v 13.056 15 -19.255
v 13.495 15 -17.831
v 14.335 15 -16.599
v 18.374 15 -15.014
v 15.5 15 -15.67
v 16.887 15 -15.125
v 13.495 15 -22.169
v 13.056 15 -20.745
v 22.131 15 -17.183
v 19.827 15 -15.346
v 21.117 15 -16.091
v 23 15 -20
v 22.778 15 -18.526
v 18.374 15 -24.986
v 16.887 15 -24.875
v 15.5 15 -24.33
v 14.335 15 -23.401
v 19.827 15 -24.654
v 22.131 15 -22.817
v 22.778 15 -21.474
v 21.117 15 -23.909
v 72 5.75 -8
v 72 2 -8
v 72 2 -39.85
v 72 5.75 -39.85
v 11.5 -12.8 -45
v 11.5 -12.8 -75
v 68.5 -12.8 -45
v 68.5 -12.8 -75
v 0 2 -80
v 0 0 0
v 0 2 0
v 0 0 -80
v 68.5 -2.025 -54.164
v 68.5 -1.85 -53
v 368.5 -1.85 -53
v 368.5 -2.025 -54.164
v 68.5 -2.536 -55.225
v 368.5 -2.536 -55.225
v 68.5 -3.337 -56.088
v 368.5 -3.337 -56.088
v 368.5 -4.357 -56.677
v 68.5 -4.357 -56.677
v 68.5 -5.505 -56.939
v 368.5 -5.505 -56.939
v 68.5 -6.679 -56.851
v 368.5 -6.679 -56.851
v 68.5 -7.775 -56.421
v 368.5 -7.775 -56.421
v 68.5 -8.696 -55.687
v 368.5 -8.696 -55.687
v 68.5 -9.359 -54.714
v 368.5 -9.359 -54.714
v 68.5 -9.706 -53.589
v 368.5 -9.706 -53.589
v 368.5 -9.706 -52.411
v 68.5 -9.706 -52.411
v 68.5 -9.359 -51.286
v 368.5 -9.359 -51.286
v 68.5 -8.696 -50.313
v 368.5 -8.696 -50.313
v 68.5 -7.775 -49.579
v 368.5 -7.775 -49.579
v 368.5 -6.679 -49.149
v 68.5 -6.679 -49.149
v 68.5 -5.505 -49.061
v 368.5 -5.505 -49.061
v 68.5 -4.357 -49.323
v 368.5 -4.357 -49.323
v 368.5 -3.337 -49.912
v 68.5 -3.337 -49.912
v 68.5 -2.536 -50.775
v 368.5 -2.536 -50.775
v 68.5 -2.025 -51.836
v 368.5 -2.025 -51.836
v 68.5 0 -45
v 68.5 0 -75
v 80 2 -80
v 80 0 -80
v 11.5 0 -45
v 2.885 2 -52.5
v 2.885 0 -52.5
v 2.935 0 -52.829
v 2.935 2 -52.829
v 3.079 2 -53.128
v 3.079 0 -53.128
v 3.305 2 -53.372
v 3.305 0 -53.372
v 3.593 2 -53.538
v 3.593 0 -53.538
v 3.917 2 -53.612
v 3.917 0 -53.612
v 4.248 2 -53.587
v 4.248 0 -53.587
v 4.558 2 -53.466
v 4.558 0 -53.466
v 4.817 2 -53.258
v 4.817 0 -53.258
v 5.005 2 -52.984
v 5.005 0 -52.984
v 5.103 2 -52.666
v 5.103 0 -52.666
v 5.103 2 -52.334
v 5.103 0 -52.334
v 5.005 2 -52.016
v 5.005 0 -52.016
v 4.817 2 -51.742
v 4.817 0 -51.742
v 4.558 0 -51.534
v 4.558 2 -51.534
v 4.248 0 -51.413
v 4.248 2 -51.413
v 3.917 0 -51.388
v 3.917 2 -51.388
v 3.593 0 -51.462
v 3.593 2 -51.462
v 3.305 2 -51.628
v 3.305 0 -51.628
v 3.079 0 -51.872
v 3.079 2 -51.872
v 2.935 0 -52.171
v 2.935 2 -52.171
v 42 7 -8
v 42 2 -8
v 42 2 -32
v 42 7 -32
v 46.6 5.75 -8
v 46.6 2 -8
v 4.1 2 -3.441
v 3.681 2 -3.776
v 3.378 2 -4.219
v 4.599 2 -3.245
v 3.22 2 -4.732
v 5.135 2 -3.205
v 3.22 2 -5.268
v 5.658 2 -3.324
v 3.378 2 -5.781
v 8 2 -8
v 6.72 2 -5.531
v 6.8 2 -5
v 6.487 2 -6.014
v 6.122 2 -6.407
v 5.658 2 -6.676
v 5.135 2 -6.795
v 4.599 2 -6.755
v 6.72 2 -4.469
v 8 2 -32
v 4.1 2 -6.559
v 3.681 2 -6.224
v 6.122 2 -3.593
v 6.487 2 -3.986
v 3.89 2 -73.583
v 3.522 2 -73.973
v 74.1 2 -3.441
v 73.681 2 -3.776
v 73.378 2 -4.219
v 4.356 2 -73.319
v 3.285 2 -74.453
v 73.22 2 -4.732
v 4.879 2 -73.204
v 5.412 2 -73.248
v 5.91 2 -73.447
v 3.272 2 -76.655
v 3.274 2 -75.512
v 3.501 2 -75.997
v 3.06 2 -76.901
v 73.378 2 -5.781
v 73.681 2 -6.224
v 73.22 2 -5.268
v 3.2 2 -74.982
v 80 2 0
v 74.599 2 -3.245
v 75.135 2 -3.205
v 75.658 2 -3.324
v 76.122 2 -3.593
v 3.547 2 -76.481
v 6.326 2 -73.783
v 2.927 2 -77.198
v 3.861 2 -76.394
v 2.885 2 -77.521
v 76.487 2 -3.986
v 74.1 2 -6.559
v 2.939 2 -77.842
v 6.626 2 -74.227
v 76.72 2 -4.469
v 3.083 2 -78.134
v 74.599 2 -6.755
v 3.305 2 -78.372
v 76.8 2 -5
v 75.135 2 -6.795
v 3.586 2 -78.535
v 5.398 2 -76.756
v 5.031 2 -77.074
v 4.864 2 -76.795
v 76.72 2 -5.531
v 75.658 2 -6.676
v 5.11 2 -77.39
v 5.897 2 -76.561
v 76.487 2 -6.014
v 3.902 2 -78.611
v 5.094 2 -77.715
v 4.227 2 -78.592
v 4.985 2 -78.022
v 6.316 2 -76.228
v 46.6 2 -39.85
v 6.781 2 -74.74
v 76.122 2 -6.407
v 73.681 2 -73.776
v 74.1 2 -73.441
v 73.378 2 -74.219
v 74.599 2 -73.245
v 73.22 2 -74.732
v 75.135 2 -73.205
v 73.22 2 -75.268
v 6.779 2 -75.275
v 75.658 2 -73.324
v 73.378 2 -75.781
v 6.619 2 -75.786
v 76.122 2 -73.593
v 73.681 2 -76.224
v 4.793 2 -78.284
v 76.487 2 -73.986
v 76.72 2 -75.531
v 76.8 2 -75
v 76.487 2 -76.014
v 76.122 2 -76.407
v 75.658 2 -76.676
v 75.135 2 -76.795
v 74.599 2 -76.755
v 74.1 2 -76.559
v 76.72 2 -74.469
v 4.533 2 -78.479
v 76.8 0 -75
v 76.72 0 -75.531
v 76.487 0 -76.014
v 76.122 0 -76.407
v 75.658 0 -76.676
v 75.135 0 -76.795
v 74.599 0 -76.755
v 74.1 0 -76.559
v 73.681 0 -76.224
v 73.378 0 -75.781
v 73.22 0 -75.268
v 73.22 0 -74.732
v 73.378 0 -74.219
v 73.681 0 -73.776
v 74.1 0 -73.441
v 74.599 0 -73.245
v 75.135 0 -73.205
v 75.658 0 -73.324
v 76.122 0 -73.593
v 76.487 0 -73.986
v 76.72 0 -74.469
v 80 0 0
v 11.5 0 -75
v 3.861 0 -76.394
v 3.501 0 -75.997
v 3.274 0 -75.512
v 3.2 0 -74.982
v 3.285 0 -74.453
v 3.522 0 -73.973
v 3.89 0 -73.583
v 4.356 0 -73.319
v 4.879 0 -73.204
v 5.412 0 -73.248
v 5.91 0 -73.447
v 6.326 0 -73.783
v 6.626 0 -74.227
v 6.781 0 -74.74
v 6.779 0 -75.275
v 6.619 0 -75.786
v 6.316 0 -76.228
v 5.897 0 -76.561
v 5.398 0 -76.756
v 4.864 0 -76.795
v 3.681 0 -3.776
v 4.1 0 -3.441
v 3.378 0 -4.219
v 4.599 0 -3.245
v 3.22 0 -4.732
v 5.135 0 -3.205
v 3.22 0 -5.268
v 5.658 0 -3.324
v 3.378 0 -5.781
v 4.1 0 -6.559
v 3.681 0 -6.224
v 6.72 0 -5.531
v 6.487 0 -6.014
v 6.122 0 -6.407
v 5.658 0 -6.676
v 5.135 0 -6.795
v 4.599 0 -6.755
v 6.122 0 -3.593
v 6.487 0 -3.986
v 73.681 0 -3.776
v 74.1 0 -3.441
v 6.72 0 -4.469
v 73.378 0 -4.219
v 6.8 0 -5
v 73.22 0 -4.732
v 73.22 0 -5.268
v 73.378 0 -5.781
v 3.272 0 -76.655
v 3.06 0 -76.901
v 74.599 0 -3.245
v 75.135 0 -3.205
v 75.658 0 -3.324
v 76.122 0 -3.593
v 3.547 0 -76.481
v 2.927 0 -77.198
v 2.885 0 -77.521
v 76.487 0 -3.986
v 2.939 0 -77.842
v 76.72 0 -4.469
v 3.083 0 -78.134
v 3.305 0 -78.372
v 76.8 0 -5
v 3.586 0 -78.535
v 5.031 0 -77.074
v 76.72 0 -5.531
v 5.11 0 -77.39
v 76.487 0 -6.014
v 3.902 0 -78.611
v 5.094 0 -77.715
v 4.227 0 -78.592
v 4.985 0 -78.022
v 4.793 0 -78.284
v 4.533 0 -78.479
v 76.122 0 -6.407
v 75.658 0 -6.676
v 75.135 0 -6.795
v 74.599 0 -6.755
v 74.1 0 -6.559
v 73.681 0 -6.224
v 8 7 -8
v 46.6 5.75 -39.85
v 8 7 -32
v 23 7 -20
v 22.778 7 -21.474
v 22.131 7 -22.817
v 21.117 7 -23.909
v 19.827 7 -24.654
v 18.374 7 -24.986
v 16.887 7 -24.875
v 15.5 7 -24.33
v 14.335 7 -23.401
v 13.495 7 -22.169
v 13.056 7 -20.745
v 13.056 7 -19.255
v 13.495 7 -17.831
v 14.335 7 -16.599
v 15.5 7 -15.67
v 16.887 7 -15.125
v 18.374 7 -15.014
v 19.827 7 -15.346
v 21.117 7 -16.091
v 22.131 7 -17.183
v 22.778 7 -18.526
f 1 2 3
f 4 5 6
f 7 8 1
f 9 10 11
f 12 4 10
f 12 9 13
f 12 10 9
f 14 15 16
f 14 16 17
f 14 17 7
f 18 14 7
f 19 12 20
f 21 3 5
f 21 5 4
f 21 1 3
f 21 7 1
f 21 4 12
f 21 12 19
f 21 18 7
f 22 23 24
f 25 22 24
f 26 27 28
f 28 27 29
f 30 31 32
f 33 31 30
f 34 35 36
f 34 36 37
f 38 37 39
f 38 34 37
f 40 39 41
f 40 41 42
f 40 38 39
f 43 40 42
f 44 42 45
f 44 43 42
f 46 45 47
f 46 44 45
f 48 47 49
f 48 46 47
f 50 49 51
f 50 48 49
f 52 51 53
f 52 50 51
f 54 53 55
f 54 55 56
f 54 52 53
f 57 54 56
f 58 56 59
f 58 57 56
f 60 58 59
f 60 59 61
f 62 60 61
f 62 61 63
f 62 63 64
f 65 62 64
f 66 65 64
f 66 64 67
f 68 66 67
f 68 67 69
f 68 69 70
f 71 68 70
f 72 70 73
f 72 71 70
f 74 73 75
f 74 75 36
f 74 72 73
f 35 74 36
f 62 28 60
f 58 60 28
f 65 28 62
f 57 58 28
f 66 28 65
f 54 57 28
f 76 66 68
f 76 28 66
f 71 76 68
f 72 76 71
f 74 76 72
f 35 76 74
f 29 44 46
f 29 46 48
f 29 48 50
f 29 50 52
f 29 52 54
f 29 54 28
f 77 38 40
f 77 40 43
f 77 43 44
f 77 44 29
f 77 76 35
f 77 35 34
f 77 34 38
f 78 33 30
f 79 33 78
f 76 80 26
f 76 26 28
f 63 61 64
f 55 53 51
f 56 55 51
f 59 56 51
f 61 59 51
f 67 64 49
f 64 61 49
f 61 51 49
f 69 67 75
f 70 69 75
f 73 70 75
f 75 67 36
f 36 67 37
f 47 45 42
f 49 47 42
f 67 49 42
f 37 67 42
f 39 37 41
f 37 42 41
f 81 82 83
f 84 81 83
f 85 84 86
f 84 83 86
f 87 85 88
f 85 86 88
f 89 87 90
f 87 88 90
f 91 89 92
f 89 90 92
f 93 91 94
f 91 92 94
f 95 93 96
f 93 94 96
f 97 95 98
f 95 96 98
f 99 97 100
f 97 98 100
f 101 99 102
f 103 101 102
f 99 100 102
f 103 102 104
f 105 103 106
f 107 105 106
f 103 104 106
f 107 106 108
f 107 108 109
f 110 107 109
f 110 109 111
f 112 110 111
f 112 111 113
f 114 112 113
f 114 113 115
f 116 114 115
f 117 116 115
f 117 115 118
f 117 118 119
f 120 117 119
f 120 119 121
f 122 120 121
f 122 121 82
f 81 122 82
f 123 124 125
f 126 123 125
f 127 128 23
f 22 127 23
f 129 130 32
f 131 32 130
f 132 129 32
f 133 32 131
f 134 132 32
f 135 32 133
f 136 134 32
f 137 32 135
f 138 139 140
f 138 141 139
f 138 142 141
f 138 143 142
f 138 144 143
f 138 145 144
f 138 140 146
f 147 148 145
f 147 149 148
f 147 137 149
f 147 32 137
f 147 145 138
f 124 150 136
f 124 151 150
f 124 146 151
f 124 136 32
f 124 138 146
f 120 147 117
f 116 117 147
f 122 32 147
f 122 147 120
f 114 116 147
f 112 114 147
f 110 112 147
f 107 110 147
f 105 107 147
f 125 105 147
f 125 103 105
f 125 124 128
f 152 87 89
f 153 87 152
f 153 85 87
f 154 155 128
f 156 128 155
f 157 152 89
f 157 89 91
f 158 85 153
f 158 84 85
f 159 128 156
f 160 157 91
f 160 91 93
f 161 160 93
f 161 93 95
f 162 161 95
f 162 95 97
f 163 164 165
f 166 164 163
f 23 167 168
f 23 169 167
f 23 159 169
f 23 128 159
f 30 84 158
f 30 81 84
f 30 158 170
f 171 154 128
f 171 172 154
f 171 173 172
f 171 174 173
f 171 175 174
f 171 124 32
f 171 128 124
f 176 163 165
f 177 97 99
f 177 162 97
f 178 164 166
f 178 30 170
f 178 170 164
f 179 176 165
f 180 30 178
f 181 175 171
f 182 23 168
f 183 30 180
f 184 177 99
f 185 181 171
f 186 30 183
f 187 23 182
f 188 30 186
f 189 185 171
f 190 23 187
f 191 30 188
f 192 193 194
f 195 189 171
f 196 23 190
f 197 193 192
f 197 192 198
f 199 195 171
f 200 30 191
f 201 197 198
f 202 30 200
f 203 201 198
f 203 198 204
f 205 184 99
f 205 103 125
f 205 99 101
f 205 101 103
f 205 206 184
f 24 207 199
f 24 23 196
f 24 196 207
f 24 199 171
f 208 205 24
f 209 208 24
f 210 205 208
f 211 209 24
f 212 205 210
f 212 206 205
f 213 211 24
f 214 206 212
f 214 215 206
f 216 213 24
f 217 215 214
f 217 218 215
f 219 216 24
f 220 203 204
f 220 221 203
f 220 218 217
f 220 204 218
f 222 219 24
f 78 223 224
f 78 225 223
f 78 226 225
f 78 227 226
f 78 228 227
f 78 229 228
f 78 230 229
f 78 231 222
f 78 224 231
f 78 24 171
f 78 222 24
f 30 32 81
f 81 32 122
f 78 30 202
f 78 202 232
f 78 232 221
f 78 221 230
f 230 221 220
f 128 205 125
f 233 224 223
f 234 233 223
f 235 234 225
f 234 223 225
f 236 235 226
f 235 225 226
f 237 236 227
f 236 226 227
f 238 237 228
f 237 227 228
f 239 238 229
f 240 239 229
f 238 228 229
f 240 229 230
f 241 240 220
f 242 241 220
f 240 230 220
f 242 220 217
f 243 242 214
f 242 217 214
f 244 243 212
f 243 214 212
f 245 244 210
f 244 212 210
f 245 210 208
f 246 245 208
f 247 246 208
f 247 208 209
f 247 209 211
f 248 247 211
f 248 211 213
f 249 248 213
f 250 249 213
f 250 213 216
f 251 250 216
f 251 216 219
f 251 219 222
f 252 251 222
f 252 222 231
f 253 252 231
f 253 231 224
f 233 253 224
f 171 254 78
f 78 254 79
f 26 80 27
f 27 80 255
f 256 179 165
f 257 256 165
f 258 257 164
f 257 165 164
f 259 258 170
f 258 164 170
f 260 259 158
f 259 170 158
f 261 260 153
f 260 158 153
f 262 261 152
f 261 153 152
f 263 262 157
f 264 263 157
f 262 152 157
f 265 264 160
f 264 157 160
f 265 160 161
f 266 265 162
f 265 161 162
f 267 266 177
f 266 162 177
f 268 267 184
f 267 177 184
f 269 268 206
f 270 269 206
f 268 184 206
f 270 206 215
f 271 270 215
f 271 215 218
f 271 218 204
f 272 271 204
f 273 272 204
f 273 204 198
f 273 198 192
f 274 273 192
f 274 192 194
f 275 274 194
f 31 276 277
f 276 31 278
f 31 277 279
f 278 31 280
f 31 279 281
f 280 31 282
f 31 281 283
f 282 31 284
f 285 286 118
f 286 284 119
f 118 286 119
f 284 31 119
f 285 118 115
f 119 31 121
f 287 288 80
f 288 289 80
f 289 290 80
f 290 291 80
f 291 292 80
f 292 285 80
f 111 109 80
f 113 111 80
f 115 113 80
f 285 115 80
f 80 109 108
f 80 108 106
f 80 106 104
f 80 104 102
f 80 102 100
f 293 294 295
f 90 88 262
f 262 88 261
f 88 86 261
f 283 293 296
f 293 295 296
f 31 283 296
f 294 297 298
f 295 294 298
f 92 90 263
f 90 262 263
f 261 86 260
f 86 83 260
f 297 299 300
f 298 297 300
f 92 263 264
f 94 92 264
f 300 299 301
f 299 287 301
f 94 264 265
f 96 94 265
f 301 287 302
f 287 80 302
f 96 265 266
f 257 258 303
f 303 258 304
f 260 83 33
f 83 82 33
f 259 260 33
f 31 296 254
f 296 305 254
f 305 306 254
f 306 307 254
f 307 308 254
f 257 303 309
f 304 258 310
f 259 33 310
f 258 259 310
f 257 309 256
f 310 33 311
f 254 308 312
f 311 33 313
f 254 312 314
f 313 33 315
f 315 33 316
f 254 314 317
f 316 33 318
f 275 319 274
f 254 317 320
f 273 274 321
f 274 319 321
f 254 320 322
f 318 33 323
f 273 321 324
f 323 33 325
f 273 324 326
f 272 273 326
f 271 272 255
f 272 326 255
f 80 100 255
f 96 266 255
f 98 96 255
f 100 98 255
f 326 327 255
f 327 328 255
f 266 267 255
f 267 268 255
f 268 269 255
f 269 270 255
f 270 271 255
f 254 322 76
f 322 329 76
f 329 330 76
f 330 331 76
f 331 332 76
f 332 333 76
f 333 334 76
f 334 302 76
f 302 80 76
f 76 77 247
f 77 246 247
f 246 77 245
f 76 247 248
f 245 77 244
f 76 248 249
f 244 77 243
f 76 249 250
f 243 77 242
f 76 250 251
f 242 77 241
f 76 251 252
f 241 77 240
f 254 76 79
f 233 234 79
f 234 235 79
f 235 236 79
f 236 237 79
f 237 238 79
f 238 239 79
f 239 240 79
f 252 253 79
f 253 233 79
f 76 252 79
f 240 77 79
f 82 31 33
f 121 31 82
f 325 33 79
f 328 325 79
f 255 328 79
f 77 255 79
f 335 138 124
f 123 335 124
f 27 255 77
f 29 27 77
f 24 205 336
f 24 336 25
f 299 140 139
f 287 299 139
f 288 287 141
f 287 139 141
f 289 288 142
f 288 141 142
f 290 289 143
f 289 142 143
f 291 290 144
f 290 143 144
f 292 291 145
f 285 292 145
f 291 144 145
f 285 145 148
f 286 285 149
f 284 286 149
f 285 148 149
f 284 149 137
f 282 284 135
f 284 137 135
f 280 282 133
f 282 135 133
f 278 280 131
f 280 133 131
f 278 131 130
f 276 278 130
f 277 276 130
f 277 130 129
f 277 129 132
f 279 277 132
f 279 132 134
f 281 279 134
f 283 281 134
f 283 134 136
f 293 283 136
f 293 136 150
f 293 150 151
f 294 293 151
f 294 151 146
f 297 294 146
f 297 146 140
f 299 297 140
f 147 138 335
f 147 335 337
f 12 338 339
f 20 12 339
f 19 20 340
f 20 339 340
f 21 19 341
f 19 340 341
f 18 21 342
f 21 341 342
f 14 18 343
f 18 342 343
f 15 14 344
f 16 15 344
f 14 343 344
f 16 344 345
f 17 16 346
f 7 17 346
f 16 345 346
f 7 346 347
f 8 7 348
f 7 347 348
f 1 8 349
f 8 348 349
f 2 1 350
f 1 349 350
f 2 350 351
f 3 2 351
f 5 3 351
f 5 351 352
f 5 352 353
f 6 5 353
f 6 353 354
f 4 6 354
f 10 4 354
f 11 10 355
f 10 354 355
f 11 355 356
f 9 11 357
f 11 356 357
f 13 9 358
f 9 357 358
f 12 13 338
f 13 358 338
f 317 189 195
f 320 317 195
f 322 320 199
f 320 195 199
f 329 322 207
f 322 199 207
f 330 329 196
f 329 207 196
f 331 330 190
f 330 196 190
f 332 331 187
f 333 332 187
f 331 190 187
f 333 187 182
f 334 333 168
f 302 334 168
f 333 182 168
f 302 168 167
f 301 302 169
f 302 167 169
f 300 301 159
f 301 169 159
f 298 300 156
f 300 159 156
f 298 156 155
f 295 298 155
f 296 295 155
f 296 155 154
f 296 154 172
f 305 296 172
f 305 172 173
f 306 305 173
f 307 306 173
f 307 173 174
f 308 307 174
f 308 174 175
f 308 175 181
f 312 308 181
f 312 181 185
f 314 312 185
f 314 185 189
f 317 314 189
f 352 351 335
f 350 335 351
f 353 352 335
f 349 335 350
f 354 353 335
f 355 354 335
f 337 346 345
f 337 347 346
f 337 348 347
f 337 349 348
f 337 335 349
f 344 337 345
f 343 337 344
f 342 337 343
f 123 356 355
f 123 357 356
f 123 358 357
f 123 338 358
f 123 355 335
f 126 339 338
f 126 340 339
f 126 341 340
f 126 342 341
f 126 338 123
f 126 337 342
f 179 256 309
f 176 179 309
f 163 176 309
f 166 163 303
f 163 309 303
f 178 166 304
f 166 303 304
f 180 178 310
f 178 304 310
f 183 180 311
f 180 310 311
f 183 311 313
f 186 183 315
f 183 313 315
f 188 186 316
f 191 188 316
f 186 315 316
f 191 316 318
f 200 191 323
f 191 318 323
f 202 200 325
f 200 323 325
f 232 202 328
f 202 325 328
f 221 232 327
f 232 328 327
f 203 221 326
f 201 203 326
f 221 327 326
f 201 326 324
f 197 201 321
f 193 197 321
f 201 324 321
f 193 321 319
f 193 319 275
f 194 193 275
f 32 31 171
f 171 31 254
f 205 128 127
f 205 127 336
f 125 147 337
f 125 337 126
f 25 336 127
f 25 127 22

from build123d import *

# Parameters (mm, degrees)
SKETCH1_W                  = 80
SKETCH1_H                  = 80
PCB_DEPTH                  = 2
SKETCH2_R                  = 1.8
ATTACHMENT_HOLES_DEPTH     = 3
LPATTERN1_COUNT            = 2
LPATTERN1_PITCH            = 70
LPATTERN1_COUNT_DIR2       = 2
LPATTERN1_PITCH_DIR2       = 70
SKETCH3_W                  = 57
SKETCH3_H                  = 30
COMMS_CHIP_DEPTH           = 12.8
SKETCH4_R                  = 1.115
COMM_CHIP_ATTACHMENT_DEPTH = 15.8
LPATTERN2_COUNT            = 2
LPATTERN2_PITCH            = 25
SKETCH5_W                  = 34
SKETCH5_H                  = 24
ARDUCAMMINI_DEPTH          = 5
SKETCH8_R                  = 5
LENS_APPROXIMATE_DEPTH     = 8
SKETCH6_W                  = 25.4
SKETCH6_H                  = 31.85
SD_CARD_DEPTH              = 3.75
SKETCH7_R                  = 3.95
ANTENNA_DEPTH              = 300


with BuildPart() as part:
    # Sketch1 → PCB (new body)
    with BuildSketch(Plane(origin=(0, 0, 0), x_dir=(1, 0, 0), z_dir=(0, 1, 0))):
        with Locations((40, 40)):
            Rectangle(SKETCH1_W, SKETCH1_H)
    extrude(amount=PCB_DEPTH)

    # Sketch2 → Attachment Holes (cut, through all)
    with BuildSketch(Plane(origin=(0, 2, 0), x_dir=(1, 0, 0), z_dir=(0, 1, 0))):
        with Locations((5, 75)):
            Circle(SKETCH2_R)
    attachment_holes = extrude(amount=-ATTACHMENT_HOLES_DEPTH, mode=Mode.SUBTRACT)

    # LPattern1: Attachment Holes 2 × 2
    with Locations(*[(i * LPATTERN1_PITCH, 0, j * LPATTERN1_PITCH_DIR2) for i in range(LPATTERN1_COUNT) for j in range(LPATTERN1_COUNT_DIR2) if (i, j) != (0, 0)]):
        add(attachment_holes, mode=Mode.SUBTRACT)

    # Sketch3 → Comms Chip (add)
    with BuildSketch(Plane(origin=(0, 0, 0), x_dir=(1, 0, 0), z_dir=(0, 1, 0))):
        with Locations((40, 60)):
            Rectangle(SKETCH3_W, SKETCH3_H)
    extrude(amount=-COMMS_CHIP_DEPTH)

    # Sketch4 → Comm chip attachment (cut, through all)
    with BuildSketch(Plane(origin=(0, -12.8, 0), x_dir=(-1, 0, 0), z_dir=(0, -1, 0))):
        with Locations((-4, 77.5)):
            Circle(SKETCH4_R)
    comm_chip_attachment = extrude(amount=-COMM_CHIP_ATTACHMENT_DEPTH, mode=Mode.SUBTRACT)

    # LPattern2: Comm chip attachment ×2
    with Locations(*[(0, 0, i * LPATTERN2_PITCH) for i in range(1, LPATTERN2_COUNT)]):
        add(comm_chip_attachment, mode=Mode.SUBTRACT)

    # Sketch5 → ArducamMini (add)
    with BuildSketch(Plane(origin=(0, 2, 0), x_dir=(1, 0, 0), z_dir=(0, 1, 0))):
        with Locations((25, 20)):
            Rectangle(SKETCH5_W, SKETCH5_H)
    extrude(amount=ARDUCAMMINI_DEPTH)

    # Sketch8 → Lens, approximate (add)
    with BuildSketch(Plane(origin=(0, 7, 0), x_dir=(1, 0, 0), z_dir=(0, 1, 0))):
        with Locations((18, 20)):
            Circle(SKETCH8_R)
    extrude(amount=LENS_APPROXIMATE_DEPTH)

    # Sketch6 → SD Card (add)
    with BuildSketch(Plane(origin=(0, 2, 0), x_dir=(1, 0, 0), z_dir=(0, 1, 0))):
        with Locations((59.3, 23.925)):
            Rectangle(SKETCH6_W, SKETCH6_H)
    extrude(amount=SD_CARD_DEPTH)

    # Sketch7 → Antenna (add)
    with BuildSketch(Plane(origin=(68.5, -53.7, 0), x_dir=(0, 1, 0), z_dir=(-1, 0, 0))):
        with Locations((47.9, 53)):
            Circle(SKETCH7_R)
    extrude(amount=-ANTENNA_DEPTH)


solid = part.part
